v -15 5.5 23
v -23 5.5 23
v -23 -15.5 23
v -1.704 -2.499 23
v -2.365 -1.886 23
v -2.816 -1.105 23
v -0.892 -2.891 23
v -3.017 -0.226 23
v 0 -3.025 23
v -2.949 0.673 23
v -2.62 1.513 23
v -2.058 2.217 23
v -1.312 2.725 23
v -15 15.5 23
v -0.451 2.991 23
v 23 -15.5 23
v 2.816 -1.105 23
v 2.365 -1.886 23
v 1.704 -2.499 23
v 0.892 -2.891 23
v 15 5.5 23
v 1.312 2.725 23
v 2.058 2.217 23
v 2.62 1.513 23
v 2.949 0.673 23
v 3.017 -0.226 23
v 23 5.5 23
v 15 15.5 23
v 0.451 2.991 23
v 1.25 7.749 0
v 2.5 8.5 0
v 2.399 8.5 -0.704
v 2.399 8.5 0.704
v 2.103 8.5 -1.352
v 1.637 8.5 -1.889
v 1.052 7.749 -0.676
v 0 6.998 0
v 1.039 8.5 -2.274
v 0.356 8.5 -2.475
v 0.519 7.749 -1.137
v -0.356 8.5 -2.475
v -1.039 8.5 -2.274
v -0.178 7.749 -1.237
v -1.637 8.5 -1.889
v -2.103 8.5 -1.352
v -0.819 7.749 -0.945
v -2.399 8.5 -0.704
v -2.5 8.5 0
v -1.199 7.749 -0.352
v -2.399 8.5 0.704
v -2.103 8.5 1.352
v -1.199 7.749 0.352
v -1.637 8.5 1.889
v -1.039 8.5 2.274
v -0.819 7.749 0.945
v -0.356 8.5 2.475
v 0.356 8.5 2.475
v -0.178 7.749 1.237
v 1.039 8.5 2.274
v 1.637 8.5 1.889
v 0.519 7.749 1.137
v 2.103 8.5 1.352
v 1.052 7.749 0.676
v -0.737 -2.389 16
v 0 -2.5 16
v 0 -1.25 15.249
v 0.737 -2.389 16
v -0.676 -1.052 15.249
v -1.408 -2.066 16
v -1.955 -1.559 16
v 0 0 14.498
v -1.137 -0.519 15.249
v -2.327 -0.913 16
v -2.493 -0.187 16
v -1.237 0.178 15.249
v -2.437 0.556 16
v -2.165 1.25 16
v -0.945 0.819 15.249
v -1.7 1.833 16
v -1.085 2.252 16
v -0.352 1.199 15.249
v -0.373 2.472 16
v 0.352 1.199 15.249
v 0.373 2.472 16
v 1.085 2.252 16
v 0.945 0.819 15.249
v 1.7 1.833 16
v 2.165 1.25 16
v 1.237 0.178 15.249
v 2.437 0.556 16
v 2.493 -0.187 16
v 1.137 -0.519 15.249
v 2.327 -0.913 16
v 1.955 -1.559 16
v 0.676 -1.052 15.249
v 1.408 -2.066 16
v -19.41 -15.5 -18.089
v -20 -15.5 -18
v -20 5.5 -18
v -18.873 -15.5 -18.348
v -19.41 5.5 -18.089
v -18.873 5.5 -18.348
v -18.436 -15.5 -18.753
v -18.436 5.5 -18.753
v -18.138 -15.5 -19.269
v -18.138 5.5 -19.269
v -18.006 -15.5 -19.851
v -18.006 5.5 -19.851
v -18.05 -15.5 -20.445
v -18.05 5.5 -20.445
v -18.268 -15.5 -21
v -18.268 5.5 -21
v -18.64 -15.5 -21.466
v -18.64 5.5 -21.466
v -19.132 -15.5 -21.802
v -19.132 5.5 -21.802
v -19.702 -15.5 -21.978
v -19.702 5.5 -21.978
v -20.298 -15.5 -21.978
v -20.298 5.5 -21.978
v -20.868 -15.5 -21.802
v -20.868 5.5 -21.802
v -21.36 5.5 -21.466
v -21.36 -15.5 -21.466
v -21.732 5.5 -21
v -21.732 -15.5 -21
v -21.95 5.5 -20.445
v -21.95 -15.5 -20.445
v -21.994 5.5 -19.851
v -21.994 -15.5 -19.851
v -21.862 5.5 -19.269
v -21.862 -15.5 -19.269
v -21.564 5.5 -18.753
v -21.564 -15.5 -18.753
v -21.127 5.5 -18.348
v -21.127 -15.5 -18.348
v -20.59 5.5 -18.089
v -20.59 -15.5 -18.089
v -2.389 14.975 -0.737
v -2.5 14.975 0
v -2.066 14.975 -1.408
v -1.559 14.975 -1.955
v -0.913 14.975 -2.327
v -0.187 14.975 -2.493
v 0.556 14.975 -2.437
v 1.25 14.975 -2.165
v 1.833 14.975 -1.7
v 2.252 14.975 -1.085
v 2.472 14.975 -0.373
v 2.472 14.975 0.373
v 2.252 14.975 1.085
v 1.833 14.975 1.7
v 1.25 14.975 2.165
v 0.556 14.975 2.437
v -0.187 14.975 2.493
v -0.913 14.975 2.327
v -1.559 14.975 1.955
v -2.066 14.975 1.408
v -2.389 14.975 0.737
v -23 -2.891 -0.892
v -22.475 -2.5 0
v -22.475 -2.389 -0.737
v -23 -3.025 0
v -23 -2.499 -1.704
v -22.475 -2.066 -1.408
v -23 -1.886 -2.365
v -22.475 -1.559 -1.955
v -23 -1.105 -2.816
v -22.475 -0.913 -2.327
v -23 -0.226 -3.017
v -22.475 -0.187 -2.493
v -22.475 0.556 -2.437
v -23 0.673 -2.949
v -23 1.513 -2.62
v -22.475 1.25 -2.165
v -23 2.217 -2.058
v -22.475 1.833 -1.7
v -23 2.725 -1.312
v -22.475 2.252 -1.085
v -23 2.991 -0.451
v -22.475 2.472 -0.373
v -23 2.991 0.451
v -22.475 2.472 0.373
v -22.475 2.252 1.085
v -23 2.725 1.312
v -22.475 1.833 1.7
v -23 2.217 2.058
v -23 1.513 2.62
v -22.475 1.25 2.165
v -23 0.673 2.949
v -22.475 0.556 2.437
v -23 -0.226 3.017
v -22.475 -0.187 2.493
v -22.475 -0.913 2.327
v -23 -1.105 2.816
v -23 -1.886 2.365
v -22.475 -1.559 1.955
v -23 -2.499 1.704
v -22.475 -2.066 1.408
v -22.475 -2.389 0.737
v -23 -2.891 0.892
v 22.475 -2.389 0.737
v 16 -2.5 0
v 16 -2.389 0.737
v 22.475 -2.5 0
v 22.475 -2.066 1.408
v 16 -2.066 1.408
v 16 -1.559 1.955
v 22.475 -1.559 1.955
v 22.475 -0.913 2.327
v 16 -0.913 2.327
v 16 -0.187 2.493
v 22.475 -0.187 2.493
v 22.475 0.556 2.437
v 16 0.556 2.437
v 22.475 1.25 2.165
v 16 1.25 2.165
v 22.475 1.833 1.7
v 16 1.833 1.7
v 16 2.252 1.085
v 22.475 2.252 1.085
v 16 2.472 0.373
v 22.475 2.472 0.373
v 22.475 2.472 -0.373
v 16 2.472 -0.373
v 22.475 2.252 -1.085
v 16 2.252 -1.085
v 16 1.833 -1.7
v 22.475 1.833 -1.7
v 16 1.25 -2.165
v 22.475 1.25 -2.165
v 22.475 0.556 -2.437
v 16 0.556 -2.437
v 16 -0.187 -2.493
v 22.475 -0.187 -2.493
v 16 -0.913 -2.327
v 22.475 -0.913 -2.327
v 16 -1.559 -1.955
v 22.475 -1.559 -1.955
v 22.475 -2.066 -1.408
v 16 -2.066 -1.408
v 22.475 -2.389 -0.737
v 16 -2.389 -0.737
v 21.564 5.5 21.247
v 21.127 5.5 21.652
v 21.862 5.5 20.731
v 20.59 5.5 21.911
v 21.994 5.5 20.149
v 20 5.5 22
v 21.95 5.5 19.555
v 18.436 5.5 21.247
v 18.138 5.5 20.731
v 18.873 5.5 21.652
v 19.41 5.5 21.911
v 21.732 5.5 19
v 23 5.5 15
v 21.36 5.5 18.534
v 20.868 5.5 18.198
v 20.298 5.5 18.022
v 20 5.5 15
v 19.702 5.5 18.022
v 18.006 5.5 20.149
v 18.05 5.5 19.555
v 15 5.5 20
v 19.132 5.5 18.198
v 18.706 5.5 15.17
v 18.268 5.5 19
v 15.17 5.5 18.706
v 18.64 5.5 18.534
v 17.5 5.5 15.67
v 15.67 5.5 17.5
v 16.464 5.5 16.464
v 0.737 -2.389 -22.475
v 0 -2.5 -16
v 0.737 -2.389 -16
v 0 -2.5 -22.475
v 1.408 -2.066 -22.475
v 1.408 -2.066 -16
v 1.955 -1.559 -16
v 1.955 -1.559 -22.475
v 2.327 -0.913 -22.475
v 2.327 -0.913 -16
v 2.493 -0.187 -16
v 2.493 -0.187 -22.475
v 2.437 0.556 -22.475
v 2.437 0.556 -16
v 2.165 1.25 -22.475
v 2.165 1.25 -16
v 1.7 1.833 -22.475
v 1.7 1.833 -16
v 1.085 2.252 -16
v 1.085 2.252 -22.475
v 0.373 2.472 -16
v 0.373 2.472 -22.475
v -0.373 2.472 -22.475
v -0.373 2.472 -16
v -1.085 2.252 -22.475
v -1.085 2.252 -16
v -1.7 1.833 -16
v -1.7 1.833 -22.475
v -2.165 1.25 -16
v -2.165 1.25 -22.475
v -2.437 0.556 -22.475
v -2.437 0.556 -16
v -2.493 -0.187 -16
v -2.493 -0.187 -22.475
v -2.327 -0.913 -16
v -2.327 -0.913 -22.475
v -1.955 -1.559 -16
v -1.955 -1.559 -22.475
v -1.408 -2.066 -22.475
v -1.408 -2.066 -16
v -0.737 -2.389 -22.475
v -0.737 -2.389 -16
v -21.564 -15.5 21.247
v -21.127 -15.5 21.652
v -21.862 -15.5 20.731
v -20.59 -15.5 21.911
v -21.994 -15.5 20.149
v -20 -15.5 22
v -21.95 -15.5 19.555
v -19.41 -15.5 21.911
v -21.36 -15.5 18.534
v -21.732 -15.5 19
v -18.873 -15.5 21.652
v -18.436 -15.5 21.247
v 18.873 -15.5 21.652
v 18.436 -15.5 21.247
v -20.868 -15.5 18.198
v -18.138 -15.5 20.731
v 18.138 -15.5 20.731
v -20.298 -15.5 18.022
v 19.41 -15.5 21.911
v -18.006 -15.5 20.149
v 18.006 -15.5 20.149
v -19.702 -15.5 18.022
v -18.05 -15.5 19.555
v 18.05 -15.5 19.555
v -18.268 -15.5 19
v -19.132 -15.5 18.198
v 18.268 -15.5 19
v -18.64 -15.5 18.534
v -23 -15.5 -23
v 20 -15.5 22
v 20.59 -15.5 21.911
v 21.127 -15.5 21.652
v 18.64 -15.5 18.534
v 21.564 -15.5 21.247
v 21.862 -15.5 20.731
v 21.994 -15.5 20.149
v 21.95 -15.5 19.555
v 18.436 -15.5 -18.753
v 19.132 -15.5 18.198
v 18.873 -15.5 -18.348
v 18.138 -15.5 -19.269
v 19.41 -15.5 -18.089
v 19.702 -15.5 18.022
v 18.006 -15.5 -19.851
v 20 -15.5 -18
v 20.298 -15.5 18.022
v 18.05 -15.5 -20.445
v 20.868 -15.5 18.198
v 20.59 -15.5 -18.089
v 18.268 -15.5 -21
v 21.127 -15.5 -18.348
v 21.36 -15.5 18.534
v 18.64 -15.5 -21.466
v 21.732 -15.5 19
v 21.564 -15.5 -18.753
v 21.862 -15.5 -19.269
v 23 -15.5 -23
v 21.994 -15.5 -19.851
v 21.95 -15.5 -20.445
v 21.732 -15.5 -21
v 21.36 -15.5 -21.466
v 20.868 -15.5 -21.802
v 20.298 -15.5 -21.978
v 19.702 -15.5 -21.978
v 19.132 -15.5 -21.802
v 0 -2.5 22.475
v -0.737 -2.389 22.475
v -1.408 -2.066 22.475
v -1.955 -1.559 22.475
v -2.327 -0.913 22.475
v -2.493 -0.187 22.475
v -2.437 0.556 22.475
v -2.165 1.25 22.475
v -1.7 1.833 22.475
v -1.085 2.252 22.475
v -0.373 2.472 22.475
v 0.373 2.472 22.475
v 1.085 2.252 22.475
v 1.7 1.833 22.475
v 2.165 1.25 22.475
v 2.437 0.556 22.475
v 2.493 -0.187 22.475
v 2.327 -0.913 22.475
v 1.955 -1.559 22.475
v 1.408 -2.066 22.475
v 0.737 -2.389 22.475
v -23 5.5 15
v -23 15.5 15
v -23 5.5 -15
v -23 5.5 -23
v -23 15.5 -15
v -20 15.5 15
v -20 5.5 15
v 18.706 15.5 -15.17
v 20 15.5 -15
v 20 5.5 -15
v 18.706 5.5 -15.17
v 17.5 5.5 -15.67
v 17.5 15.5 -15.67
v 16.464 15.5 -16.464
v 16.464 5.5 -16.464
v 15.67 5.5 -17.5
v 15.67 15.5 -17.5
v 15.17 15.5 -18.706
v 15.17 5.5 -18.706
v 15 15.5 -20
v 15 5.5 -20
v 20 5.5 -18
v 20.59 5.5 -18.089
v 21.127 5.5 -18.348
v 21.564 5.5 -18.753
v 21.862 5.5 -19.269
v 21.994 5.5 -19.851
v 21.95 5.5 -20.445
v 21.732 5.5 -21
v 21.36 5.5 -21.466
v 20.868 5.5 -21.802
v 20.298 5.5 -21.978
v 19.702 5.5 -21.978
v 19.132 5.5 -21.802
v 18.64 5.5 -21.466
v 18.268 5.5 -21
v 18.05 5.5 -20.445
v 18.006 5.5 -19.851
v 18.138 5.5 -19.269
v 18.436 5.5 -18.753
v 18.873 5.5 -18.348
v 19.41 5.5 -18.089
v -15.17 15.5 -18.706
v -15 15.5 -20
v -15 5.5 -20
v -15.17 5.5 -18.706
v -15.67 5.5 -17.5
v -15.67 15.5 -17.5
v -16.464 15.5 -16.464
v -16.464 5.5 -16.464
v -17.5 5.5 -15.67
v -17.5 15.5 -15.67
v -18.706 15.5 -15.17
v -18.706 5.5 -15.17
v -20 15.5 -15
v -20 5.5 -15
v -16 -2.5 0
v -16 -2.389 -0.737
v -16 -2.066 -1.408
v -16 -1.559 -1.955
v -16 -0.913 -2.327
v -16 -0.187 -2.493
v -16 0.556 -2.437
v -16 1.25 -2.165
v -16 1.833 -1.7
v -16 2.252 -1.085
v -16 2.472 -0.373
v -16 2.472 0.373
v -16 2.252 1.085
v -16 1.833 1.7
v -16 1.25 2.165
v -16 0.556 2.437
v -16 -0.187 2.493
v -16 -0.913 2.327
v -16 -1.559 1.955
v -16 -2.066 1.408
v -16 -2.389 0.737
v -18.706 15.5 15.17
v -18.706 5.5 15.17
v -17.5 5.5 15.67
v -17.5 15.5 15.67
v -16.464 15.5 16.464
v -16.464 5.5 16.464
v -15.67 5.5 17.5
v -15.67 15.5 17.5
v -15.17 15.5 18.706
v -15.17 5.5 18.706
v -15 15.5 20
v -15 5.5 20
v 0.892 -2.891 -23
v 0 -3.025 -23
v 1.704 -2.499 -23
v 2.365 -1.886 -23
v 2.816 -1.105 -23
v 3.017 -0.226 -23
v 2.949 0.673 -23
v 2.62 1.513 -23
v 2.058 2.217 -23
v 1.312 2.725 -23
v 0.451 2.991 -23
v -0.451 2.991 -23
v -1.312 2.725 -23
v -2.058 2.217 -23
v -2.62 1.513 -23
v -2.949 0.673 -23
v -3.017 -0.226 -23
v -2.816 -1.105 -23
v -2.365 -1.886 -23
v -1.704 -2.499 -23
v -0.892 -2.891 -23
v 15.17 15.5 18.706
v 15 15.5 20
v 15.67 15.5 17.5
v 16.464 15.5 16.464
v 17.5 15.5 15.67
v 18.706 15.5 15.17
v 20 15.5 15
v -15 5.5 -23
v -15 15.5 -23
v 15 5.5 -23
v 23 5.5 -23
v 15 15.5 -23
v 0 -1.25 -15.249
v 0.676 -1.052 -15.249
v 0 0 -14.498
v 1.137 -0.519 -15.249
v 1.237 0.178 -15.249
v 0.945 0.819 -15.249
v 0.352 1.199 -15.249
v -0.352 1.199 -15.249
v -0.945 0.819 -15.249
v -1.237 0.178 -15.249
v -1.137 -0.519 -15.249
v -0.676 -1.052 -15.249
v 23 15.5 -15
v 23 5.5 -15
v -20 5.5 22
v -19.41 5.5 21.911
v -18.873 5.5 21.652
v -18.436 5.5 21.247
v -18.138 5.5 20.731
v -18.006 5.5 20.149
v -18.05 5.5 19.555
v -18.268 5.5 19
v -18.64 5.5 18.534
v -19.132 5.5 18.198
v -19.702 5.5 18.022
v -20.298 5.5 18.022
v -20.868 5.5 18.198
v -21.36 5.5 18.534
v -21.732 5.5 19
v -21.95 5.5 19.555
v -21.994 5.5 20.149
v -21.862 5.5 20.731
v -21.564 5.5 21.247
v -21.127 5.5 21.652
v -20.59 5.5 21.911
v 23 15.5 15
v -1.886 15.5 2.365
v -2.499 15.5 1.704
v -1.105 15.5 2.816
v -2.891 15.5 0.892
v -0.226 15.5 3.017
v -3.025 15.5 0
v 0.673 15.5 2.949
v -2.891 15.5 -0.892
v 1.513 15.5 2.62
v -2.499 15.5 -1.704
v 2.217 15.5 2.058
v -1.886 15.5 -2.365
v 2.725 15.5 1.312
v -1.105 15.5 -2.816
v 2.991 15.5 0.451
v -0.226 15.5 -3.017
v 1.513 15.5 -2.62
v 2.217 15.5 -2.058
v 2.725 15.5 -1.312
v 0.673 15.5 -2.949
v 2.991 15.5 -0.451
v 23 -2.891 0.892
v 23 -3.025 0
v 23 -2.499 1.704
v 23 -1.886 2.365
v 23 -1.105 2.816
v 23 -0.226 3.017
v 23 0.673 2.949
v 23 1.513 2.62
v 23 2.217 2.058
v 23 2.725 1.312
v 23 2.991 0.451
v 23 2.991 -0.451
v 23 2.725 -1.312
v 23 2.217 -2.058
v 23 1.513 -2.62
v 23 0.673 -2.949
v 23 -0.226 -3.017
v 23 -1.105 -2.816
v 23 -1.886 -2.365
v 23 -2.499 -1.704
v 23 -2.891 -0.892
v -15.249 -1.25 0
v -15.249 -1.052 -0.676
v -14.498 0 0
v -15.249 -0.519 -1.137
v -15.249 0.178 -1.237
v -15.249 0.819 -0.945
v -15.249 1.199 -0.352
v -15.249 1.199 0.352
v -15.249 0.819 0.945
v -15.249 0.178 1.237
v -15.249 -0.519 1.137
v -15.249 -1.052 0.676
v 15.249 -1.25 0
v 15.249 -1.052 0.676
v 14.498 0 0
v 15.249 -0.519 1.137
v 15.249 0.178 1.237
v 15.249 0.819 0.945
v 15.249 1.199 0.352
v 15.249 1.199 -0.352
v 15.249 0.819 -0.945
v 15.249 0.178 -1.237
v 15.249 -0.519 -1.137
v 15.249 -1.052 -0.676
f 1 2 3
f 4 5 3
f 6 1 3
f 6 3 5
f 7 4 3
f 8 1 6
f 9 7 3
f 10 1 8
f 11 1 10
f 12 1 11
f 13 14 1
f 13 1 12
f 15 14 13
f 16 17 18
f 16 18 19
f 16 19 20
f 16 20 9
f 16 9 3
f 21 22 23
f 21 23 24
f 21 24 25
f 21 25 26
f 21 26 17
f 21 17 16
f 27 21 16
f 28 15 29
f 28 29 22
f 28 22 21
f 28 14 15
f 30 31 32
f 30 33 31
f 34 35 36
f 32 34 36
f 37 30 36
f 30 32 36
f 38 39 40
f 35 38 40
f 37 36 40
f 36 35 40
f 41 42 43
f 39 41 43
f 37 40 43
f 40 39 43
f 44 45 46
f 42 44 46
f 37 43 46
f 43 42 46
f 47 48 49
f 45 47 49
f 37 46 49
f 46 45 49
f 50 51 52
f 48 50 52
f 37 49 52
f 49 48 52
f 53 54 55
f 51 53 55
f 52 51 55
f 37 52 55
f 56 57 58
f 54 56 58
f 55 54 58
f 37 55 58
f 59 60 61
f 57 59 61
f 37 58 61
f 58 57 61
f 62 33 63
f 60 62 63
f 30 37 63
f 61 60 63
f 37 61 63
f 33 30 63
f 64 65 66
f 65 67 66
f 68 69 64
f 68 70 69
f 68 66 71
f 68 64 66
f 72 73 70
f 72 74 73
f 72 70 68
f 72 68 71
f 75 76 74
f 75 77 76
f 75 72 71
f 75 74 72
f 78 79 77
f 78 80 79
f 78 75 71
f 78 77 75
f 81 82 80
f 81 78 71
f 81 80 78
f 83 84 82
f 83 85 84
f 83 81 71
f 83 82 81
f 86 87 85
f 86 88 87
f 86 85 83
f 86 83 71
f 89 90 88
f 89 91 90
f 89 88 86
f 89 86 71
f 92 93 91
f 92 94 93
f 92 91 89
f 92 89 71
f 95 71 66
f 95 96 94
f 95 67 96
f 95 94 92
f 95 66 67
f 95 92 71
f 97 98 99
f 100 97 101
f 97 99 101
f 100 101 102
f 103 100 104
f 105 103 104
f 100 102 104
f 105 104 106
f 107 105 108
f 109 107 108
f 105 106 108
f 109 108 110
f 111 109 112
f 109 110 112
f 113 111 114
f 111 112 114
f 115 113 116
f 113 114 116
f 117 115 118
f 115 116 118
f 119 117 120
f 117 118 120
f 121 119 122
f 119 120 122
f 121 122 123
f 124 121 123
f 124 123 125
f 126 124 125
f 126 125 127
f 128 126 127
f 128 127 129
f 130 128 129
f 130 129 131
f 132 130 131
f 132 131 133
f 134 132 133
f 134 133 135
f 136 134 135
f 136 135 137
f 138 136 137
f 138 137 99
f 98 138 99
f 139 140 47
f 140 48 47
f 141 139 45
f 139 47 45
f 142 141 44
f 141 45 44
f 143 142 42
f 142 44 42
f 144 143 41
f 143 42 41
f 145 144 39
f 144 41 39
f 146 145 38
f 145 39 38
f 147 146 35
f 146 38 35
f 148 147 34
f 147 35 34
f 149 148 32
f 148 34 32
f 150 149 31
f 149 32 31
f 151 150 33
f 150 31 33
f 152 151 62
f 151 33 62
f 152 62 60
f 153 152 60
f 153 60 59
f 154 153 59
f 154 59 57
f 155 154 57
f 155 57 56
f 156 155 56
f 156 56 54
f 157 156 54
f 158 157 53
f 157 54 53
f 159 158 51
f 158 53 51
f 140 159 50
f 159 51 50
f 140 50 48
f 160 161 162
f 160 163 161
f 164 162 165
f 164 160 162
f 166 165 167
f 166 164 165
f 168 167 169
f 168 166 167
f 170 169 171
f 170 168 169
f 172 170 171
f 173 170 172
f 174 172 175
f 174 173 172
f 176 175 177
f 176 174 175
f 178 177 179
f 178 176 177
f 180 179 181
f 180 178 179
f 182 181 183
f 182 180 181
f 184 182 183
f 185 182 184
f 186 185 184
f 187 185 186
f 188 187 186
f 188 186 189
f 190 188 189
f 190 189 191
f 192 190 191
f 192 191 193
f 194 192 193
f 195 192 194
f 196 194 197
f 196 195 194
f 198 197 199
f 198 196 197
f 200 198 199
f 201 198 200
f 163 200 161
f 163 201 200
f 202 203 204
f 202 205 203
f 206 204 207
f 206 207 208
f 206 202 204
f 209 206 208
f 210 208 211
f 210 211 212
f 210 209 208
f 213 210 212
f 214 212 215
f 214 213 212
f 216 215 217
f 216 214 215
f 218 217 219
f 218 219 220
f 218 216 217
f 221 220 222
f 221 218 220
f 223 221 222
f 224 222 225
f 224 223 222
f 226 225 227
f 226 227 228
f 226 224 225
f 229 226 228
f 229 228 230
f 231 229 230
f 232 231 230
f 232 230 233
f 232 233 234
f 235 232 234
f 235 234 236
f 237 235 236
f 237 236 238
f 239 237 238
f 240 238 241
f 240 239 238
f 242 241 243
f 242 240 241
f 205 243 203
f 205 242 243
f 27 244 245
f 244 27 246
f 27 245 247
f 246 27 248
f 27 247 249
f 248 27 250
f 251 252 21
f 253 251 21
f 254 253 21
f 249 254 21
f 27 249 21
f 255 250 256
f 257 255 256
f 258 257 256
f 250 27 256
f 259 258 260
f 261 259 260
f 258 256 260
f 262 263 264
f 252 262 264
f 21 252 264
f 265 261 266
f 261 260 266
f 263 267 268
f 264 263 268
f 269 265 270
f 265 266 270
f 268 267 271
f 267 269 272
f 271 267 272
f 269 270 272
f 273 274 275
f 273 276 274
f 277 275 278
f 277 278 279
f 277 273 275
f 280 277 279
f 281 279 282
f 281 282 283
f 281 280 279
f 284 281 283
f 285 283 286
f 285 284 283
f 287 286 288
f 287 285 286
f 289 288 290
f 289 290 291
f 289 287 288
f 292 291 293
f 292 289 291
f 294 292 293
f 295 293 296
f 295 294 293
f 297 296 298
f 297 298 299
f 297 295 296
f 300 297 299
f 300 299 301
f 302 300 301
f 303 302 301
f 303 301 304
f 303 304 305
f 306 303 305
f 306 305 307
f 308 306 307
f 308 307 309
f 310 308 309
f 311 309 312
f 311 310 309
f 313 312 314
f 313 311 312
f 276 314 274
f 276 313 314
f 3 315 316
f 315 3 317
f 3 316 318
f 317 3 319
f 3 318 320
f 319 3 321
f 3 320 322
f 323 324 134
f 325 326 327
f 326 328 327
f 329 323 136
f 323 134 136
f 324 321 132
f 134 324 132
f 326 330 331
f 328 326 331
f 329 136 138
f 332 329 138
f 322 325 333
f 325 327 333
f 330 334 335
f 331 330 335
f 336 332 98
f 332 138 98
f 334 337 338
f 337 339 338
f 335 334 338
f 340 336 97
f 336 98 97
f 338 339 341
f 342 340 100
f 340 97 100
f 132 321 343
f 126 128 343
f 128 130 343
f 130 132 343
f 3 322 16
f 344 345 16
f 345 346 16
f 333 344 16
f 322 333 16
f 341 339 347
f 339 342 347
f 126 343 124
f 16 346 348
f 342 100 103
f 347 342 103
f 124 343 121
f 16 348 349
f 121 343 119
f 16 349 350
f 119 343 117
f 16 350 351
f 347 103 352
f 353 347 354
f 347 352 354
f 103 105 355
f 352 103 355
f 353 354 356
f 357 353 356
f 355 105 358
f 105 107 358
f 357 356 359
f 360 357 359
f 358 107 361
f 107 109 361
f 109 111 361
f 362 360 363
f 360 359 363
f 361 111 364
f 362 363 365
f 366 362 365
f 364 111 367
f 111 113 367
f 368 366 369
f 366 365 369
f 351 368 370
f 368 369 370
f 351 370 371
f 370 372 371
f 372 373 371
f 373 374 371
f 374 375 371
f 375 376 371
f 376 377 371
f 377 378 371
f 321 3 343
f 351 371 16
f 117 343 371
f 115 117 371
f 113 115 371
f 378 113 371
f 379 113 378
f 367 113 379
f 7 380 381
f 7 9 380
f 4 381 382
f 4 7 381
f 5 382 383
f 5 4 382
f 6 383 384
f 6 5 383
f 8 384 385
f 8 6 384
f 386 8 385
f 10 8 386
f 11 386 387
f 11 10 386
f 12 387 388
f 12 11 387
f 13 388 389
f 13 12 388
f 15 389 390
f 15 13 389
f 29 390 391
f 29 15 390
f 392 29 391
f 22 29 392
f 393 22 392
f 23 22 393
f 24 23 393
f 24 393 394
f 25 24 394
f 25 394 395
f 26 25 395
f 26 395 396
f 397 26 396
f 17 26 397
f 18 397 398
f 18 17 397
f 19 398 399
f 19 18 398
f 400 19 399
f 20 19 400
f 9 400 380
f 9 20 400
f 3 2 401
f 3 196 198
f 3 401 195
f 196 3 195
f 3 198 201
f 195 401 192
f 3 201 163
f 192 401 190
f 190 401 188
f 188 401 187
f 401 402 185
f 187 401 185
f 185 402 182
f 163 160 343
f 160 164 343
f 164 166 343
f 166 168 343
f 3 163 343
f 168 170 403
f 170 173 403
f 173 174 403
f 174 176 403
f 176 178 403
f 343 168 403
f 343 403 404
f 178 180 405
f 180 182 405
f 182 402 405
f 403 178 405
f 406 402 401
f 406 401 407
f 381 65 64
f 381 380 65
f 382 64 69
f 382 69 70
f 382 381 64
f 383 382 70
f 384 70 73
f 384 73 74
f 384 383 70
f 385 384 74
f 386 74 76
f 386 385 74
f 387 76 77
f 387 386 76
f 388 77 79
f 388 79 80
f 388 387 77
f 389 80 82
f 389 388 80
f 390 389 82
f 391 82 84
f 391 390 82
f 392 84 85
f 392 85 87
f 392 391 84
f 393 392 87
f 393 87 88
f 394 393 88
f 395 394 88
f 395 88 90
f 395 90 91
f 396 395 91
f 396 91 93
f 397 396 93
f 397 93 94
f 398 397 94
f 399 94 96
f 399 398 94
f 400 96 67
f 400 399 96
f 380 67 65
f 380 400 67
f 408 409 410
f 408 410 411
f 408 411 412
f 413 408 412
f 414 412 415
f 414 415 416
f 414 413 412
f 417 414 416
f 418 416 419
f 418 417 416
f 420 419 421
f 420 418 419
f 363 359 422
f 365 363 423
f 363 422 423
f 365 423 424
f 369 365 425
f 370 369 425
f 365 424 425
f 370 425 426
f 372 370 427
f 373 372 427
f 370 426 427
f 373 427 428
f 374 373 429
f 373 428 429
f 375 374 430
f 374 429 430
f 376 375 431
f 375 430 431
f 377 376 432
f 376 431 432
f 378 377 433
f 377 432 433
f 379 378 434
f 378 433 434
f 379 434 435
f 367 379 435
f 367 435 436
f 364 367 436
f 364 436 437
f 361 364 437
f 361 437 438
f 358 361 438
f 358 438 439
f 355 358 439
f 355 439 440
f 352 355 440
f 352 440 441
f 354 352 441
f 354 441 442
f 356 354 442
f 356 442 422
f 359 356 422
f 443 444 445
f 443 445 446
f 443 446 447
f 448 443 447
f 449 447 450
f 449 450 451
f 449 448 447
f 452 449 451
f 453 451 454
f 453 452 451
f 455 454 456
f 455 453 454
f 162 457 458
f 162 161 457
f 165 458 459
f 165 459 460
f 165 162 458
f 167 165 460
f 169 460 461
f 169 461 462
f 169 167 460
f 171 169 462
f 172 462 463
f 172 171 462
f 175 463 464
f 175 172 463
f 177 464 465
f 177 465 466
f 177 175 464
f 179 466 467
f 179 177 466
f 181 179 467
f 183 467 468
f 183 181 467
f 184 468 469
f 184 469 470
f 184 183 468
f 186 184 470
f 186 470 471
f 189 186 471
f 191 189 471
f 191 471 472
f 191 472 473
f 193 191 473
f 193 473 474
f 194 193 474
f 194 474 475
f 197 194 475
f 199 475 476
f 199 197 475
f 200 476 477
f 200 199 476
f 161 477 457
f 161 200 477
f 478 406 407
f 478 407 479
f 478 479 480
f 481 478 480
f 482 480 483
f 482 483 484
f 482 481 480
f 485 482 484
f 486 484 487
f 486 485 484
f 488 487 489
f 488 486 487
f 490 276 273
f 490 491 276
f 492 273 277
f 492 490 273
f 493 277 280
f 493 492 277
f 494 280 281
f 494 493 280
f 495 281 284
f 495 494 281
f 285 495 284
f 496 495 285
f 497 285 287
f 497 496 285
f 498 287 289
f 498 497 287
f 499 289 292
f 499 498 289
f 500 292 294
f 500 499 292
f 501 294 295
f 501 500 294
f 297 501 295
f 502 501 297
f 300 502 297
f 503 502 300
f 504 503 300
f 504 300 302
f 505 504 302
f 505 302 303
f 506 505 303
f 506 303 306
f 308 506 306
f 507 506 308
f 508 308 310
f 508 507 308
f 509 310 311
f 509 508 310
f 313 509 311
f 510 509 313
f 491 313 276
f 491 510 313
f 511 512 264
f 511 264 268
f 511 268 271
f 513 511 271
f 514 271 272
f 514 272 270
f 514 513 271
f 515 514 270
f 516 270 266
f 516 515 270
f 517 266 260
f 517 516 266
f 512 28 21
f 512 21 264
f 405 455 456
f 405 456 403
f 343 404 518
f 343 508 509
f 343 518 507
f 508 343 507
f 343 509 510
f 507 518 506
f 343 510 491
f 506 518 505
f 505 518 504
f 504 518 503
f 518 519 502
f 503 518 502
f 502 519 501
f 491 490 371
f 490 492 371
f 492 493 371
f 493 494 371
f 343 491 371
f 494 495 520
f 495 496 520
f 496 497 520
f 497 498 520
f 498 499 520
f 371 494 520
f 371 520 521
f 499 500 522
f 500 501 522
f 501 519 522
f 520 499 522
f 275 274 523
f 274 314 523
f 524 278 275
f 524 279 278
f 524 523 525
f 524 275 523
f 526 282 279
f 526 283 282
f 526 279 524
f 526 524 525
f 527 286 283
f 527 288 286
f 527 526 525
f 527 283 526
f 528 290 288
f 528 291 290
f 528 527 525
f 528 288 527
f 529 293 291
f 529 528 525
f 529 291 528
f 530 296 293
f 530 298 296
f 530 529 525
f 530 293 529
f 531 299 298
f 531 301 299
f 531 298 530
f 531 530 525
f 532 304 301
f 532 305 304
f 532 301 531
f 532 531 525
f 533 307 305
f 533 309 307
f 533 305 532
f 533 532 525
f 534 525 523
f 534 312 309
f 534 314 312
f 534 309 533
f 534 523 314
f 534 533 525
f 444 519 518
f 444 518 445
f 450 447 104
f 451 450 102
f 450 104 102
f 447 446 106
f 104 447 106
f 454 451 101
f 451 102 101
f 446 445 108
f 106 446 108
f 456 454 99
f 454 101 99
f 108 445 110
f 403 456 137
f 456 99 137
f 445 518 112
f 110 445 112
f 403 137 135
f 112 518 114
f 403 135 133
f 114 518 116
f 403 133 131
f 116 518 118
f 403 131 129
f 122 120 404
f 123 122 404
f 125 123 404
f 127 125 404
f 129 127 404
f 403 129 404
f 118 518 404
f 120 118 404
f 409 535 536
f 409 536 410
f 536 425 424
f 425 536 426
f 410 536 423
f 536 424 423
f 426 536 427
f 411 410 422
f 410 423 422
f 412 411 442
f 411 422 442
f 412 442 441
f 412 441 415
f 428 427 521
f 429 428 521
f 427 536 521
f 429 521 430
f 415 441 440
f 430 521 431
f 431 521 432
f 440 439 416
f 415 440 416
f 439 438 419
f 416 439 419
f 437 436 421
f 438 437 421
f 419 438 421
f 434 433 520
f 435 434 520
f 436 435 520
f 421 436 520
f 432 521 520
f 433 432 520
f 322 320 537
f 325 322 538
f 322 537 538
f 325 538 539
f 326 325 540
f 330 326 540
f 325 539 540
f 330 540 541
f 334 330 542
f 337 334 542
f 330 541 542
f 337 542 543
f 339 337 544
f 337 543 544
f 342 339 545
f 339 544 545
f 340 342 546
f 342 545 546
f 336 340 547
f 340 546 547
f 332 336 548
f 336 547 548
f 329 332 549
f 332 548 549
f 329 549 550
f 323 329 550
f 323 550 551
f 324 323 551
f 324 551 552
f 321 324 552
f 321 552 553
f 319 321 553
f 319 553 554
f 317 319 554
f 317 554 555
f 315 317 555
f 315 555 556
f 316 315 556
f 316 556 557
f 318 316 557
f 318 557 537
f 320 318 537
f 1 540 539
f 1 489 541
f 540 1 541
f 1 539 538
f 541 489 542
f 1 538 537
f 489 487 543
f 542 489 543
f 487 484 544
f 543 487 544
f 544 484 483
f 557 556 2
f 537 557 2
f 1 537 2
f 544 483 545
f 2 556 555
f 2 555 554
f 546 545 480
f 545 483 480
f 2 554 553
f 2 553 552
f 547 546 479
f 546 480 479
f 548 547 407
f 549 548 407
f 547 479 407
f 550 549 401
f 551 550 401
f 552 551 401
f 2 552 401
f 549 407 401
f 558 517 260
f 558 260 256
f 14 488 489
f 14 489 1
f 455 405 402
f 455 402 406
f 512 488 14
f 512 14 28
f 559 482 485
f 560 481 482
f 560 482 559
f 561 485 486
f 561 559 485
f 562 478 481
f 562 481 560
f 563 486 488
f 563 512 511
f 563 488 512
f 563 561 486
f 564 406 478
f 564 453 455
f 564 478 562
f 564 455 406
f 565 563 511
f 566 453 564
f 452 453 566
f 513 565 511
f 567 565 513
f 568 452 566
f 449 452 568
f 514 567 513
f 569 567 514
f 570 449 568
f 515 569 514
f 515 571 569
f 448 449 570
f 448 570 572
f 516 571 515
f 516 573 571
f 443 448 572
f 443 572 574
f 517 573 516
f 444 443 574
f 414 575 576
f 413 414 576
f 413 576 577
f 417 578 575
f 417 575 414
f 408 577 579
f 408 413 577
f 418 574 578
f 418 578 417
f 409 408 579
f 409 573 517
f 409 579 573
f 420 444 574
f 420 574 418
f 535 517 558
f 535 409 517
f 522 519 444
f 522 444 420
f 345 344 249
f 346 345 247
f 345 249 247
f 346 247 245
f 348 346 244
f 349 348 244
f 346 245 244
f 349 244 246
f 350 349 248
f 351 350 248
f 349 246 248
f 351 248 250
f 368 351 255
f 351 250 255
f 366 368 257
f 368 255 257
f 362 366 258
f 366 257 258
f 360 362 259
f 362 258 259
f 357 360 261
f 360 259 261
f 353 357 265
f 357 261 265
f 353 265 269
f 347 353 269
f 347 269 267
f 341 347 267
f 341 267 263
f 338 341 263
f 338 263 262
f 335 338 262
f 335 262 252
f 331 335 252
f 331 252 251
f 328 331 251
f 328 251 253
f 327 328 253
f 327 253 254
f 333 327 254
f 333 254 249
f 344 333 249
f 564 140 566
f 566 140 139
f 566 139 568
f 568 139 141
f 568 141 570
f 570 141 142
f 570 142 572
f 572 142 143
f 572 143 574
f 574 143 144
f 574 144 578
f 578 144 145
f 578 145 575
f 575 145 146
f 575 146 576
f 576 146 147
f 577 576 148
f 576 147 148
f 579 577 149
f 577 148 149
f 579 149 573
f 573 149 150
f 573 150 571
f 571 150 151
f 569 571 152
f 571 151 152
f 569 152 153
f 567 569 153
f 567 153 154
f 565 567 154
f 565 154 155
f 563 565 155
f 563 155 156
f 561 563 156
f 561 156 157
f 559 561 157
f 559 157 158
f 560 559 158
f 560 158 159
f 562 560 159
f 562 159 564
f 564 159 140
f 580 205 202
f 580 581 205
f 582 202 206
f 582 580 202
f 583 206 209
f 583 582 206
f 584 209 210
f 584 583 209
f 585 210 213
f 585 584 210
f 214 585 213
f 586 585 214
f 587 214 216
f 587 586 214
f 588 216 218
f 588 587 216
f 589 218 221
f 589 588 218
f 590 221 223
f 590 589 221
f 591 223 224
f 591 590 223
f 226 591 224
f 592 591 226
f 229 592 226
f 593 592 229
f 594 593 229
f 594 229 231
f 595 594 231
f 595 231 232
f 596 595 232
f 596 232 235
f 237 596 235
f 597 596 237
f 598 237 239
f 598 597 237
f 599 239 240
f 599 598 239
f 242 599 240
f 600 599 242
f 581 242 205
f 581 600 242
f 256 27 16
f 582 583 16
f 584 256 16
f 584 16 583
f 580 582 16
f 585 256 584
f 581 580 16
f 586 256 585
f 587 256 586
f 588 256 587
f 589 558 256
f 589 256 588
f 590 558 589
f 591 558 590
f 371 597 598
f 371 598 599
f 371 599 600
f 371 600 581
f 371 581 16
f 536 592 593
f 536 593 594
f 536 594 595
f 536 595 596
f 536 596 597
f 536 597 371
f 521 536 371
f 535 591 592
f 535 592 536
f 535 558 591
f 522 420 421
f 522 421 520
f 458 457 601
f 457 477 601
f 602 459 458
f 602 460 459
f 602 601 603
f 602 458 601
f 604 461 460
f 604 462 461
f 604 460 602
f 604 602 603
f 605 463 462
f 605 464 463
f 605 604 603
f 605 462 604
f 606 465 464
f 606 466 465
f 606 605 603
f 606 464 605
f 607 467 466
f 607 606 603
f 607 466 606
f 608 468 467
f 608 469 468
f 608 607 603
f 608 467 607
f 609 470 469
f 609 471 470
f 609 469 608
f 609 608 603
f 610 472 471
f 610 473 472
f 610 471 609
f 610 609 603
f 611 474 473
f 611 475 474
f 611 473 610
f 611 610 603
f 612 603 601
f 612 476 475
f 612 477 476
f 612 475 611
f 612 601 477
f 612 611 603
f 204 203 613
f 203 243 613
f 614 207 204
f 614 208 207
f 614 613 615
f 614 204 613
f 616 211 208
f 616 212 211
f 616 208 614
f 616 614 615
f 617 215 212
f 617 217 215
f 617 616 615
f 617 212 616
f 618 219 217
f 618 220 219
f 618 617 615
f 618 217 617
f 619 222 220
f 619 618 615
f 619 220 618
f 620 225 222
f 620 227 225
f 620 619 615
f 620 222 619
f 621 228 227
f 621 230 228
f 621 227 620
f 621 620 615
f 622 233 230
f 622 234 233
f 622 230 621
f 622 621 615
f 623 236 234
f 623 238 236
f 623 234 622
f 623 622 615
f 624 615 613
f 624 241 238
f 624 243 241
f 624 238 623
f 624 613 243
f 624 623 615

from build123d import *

# Parameters (mm, degrees)
SKETCH_1_W                   = 46
SKETCH_1_H                   = 46
EXTRUDE_1_DEPTH              = 15.5
CUT_EXTRUDE_1_DEPTH          = 10
SKETCH_4_R                   = 2
CUT_EXTRUDE_2_DEPTH          = 39.716921365
PATTERN_CIRCULAR_1_COUNT     = 4
HOLE_WIZARD_M6_2_D           = 5
HOLE_WIZARD_M6_2_DEPTH       = 7
HOLE_WIZARD_M6_2_CSINK_D     = 6.05
HOLE_WIZARD_M6_2_CSINK_ANGLE = 90
HOLE_WIZARD_M6_2_TIP         = 1.502151548


with BuildPart() as part:
    # 草图1 → 凸台-拉伸1 (new, symmetric)
    with BuildSketch(Plane(origin=(0, 0, 0), x_dir=(1, 0, 0), z_dir=(0, 1, 0))):
        Rectangle(SKETCH_1_W, SKETCH_1_H)
    extrude(amount=EXTRUDE_1_DEPTH, both=True)

    # 草图2 → 切除-拉伸1 (cut)
    with BuildSketch(Plane(origin=(0, 15.5, 0), x_dir=(1, 0, 0), z_dir=(0, 1, 0))):
        with BuildLine():
            Line((15, 20), (15, 23))
            Line((15, 23), (23, 23))
            Line((23, 23), (23, 15))
            Line((23, 15), (20, 15))
            ThreePointArc((20, 15), (16.464466094, 16.464466094), (15, 20))
        make_face()
        with BuildLine():
            Line((20, -15), (23, -15))
            Line((23, -15), (23, -23))
            Line((23, -23), (15, -23))
            Line((15, -23), (15, -20))
            ThreePointArc((15, -20), (16.464466094, -16.464466094), (20, -15))
        make_face()
        with BuildLine():
            Line((-15, -20), (-15, -23))
            Line((-15, -23), (-23, -23))
            Line((-23, -23), (-23, -15))
            Line((-23, -15), (-20, -15))
            ThreePointArc((-20, -15), (-16.464466094, -16.464466094), (-15, -20))
        make_face()
        with BuildLine():
            Line((-20, 15), (-23, 15))
            Line((-23, 15), (-23, 23))
            Line((-23, 23), (-15, 23))
            Line((-15, 23), (-15, 20))
            ThreePointArc((-15, 20), (-16.464466094, 16.464466094), (-20, 15))
        make_face()
    extrude(amount=-CUT_EXTRUDE_1_DEPTH, mode=Mode.SUBTRACT)

    # 草图4 → 切除-拉伸2 (cut, through all)
    with BuildSketch(Plane(origin=(0, 5.5, 0), x_dir=(1, 0, 0), z_dir=(0, 1, 0))):
        with Locations(Location((20, 20, 0), (0, 0, 270))):
            Circle(SKETCH_4_R)
        with Locations(Location((20, -20, 0), (0, 0, 270))):
            Circle(SKETCH_4_R)
        with Locations(Location((-20, -20, 0), (0, 0, 270))):
            Circle(SKETCH_4_R)
        with Locations(Location((-20, 20, 0), (0, 0, 270))):
            Circle(SKETCH_4_R)
    extrude(amount=-CUT_EXTRUDE_2_DEPTH, mode=Mode.SUBTRACT)

    # 草图6 → M6 螺纹孔1 (revolve, cut)
    with BuildSketch(Plane(origin=(0, 0, 23), x_dir=(0, -1, 0), z_dir=(1, 0, 0))):
        Polygon((0, 0), (0, 8.502151548), (2.5, 7), (2.5, 0.525), (3.025, 0), align=None)
    hole_wizard_m6_1 = revolve(axis=Axis((0, 0, 29.35), (0, 0, -1)), mode=Mode.SUBTRACT)

    # 阵列(圆周)1: M6 螺纹孔1 ×4 about axis
    pattern_circular_1_axis = Axis((0, 15.5, 0), (0, 1, 0))
    for i in range(1, PATTERN_CIRCULAR_1_COUNT):
        add(hole_wizard_m6_1.rotate(pattern_circular_1_axis, i * 360 / PATTERN_CIRCULAR_1_COUNT), mode=Mode.SUBTRACT)

    # M6 螺纹孔2
    with Locations(Plane(origin=(0, 15.5, 0), x_dir=(1, 0, 0), z_dir=(0, 1, 0))):
        with Locations((0, 0)):
            CounterSinkHole(HOLE_WIZARD_M6_2_D / 2, HOLE_WIZARD_M6_2_CSINK_D / 2, depth=HOLE_WIZARD_M6_2_DEPTH, counter_sink_angle=HOLE_WIZARD_M6_2_CSINK_ANGLE)
            with Locations((0, 0, -(HOLE_WIZARD_M6_2_DEPTH + HOLE_WIZARD_M6_2_TIP / 2))):  # 118° drill point
                Cone(0, HOLE_WIZARD_M6_2_D / 2, HOLE_WIZARD_M6_2_TIP, mode=Mode.SUBTRACT)


solid = part.part
